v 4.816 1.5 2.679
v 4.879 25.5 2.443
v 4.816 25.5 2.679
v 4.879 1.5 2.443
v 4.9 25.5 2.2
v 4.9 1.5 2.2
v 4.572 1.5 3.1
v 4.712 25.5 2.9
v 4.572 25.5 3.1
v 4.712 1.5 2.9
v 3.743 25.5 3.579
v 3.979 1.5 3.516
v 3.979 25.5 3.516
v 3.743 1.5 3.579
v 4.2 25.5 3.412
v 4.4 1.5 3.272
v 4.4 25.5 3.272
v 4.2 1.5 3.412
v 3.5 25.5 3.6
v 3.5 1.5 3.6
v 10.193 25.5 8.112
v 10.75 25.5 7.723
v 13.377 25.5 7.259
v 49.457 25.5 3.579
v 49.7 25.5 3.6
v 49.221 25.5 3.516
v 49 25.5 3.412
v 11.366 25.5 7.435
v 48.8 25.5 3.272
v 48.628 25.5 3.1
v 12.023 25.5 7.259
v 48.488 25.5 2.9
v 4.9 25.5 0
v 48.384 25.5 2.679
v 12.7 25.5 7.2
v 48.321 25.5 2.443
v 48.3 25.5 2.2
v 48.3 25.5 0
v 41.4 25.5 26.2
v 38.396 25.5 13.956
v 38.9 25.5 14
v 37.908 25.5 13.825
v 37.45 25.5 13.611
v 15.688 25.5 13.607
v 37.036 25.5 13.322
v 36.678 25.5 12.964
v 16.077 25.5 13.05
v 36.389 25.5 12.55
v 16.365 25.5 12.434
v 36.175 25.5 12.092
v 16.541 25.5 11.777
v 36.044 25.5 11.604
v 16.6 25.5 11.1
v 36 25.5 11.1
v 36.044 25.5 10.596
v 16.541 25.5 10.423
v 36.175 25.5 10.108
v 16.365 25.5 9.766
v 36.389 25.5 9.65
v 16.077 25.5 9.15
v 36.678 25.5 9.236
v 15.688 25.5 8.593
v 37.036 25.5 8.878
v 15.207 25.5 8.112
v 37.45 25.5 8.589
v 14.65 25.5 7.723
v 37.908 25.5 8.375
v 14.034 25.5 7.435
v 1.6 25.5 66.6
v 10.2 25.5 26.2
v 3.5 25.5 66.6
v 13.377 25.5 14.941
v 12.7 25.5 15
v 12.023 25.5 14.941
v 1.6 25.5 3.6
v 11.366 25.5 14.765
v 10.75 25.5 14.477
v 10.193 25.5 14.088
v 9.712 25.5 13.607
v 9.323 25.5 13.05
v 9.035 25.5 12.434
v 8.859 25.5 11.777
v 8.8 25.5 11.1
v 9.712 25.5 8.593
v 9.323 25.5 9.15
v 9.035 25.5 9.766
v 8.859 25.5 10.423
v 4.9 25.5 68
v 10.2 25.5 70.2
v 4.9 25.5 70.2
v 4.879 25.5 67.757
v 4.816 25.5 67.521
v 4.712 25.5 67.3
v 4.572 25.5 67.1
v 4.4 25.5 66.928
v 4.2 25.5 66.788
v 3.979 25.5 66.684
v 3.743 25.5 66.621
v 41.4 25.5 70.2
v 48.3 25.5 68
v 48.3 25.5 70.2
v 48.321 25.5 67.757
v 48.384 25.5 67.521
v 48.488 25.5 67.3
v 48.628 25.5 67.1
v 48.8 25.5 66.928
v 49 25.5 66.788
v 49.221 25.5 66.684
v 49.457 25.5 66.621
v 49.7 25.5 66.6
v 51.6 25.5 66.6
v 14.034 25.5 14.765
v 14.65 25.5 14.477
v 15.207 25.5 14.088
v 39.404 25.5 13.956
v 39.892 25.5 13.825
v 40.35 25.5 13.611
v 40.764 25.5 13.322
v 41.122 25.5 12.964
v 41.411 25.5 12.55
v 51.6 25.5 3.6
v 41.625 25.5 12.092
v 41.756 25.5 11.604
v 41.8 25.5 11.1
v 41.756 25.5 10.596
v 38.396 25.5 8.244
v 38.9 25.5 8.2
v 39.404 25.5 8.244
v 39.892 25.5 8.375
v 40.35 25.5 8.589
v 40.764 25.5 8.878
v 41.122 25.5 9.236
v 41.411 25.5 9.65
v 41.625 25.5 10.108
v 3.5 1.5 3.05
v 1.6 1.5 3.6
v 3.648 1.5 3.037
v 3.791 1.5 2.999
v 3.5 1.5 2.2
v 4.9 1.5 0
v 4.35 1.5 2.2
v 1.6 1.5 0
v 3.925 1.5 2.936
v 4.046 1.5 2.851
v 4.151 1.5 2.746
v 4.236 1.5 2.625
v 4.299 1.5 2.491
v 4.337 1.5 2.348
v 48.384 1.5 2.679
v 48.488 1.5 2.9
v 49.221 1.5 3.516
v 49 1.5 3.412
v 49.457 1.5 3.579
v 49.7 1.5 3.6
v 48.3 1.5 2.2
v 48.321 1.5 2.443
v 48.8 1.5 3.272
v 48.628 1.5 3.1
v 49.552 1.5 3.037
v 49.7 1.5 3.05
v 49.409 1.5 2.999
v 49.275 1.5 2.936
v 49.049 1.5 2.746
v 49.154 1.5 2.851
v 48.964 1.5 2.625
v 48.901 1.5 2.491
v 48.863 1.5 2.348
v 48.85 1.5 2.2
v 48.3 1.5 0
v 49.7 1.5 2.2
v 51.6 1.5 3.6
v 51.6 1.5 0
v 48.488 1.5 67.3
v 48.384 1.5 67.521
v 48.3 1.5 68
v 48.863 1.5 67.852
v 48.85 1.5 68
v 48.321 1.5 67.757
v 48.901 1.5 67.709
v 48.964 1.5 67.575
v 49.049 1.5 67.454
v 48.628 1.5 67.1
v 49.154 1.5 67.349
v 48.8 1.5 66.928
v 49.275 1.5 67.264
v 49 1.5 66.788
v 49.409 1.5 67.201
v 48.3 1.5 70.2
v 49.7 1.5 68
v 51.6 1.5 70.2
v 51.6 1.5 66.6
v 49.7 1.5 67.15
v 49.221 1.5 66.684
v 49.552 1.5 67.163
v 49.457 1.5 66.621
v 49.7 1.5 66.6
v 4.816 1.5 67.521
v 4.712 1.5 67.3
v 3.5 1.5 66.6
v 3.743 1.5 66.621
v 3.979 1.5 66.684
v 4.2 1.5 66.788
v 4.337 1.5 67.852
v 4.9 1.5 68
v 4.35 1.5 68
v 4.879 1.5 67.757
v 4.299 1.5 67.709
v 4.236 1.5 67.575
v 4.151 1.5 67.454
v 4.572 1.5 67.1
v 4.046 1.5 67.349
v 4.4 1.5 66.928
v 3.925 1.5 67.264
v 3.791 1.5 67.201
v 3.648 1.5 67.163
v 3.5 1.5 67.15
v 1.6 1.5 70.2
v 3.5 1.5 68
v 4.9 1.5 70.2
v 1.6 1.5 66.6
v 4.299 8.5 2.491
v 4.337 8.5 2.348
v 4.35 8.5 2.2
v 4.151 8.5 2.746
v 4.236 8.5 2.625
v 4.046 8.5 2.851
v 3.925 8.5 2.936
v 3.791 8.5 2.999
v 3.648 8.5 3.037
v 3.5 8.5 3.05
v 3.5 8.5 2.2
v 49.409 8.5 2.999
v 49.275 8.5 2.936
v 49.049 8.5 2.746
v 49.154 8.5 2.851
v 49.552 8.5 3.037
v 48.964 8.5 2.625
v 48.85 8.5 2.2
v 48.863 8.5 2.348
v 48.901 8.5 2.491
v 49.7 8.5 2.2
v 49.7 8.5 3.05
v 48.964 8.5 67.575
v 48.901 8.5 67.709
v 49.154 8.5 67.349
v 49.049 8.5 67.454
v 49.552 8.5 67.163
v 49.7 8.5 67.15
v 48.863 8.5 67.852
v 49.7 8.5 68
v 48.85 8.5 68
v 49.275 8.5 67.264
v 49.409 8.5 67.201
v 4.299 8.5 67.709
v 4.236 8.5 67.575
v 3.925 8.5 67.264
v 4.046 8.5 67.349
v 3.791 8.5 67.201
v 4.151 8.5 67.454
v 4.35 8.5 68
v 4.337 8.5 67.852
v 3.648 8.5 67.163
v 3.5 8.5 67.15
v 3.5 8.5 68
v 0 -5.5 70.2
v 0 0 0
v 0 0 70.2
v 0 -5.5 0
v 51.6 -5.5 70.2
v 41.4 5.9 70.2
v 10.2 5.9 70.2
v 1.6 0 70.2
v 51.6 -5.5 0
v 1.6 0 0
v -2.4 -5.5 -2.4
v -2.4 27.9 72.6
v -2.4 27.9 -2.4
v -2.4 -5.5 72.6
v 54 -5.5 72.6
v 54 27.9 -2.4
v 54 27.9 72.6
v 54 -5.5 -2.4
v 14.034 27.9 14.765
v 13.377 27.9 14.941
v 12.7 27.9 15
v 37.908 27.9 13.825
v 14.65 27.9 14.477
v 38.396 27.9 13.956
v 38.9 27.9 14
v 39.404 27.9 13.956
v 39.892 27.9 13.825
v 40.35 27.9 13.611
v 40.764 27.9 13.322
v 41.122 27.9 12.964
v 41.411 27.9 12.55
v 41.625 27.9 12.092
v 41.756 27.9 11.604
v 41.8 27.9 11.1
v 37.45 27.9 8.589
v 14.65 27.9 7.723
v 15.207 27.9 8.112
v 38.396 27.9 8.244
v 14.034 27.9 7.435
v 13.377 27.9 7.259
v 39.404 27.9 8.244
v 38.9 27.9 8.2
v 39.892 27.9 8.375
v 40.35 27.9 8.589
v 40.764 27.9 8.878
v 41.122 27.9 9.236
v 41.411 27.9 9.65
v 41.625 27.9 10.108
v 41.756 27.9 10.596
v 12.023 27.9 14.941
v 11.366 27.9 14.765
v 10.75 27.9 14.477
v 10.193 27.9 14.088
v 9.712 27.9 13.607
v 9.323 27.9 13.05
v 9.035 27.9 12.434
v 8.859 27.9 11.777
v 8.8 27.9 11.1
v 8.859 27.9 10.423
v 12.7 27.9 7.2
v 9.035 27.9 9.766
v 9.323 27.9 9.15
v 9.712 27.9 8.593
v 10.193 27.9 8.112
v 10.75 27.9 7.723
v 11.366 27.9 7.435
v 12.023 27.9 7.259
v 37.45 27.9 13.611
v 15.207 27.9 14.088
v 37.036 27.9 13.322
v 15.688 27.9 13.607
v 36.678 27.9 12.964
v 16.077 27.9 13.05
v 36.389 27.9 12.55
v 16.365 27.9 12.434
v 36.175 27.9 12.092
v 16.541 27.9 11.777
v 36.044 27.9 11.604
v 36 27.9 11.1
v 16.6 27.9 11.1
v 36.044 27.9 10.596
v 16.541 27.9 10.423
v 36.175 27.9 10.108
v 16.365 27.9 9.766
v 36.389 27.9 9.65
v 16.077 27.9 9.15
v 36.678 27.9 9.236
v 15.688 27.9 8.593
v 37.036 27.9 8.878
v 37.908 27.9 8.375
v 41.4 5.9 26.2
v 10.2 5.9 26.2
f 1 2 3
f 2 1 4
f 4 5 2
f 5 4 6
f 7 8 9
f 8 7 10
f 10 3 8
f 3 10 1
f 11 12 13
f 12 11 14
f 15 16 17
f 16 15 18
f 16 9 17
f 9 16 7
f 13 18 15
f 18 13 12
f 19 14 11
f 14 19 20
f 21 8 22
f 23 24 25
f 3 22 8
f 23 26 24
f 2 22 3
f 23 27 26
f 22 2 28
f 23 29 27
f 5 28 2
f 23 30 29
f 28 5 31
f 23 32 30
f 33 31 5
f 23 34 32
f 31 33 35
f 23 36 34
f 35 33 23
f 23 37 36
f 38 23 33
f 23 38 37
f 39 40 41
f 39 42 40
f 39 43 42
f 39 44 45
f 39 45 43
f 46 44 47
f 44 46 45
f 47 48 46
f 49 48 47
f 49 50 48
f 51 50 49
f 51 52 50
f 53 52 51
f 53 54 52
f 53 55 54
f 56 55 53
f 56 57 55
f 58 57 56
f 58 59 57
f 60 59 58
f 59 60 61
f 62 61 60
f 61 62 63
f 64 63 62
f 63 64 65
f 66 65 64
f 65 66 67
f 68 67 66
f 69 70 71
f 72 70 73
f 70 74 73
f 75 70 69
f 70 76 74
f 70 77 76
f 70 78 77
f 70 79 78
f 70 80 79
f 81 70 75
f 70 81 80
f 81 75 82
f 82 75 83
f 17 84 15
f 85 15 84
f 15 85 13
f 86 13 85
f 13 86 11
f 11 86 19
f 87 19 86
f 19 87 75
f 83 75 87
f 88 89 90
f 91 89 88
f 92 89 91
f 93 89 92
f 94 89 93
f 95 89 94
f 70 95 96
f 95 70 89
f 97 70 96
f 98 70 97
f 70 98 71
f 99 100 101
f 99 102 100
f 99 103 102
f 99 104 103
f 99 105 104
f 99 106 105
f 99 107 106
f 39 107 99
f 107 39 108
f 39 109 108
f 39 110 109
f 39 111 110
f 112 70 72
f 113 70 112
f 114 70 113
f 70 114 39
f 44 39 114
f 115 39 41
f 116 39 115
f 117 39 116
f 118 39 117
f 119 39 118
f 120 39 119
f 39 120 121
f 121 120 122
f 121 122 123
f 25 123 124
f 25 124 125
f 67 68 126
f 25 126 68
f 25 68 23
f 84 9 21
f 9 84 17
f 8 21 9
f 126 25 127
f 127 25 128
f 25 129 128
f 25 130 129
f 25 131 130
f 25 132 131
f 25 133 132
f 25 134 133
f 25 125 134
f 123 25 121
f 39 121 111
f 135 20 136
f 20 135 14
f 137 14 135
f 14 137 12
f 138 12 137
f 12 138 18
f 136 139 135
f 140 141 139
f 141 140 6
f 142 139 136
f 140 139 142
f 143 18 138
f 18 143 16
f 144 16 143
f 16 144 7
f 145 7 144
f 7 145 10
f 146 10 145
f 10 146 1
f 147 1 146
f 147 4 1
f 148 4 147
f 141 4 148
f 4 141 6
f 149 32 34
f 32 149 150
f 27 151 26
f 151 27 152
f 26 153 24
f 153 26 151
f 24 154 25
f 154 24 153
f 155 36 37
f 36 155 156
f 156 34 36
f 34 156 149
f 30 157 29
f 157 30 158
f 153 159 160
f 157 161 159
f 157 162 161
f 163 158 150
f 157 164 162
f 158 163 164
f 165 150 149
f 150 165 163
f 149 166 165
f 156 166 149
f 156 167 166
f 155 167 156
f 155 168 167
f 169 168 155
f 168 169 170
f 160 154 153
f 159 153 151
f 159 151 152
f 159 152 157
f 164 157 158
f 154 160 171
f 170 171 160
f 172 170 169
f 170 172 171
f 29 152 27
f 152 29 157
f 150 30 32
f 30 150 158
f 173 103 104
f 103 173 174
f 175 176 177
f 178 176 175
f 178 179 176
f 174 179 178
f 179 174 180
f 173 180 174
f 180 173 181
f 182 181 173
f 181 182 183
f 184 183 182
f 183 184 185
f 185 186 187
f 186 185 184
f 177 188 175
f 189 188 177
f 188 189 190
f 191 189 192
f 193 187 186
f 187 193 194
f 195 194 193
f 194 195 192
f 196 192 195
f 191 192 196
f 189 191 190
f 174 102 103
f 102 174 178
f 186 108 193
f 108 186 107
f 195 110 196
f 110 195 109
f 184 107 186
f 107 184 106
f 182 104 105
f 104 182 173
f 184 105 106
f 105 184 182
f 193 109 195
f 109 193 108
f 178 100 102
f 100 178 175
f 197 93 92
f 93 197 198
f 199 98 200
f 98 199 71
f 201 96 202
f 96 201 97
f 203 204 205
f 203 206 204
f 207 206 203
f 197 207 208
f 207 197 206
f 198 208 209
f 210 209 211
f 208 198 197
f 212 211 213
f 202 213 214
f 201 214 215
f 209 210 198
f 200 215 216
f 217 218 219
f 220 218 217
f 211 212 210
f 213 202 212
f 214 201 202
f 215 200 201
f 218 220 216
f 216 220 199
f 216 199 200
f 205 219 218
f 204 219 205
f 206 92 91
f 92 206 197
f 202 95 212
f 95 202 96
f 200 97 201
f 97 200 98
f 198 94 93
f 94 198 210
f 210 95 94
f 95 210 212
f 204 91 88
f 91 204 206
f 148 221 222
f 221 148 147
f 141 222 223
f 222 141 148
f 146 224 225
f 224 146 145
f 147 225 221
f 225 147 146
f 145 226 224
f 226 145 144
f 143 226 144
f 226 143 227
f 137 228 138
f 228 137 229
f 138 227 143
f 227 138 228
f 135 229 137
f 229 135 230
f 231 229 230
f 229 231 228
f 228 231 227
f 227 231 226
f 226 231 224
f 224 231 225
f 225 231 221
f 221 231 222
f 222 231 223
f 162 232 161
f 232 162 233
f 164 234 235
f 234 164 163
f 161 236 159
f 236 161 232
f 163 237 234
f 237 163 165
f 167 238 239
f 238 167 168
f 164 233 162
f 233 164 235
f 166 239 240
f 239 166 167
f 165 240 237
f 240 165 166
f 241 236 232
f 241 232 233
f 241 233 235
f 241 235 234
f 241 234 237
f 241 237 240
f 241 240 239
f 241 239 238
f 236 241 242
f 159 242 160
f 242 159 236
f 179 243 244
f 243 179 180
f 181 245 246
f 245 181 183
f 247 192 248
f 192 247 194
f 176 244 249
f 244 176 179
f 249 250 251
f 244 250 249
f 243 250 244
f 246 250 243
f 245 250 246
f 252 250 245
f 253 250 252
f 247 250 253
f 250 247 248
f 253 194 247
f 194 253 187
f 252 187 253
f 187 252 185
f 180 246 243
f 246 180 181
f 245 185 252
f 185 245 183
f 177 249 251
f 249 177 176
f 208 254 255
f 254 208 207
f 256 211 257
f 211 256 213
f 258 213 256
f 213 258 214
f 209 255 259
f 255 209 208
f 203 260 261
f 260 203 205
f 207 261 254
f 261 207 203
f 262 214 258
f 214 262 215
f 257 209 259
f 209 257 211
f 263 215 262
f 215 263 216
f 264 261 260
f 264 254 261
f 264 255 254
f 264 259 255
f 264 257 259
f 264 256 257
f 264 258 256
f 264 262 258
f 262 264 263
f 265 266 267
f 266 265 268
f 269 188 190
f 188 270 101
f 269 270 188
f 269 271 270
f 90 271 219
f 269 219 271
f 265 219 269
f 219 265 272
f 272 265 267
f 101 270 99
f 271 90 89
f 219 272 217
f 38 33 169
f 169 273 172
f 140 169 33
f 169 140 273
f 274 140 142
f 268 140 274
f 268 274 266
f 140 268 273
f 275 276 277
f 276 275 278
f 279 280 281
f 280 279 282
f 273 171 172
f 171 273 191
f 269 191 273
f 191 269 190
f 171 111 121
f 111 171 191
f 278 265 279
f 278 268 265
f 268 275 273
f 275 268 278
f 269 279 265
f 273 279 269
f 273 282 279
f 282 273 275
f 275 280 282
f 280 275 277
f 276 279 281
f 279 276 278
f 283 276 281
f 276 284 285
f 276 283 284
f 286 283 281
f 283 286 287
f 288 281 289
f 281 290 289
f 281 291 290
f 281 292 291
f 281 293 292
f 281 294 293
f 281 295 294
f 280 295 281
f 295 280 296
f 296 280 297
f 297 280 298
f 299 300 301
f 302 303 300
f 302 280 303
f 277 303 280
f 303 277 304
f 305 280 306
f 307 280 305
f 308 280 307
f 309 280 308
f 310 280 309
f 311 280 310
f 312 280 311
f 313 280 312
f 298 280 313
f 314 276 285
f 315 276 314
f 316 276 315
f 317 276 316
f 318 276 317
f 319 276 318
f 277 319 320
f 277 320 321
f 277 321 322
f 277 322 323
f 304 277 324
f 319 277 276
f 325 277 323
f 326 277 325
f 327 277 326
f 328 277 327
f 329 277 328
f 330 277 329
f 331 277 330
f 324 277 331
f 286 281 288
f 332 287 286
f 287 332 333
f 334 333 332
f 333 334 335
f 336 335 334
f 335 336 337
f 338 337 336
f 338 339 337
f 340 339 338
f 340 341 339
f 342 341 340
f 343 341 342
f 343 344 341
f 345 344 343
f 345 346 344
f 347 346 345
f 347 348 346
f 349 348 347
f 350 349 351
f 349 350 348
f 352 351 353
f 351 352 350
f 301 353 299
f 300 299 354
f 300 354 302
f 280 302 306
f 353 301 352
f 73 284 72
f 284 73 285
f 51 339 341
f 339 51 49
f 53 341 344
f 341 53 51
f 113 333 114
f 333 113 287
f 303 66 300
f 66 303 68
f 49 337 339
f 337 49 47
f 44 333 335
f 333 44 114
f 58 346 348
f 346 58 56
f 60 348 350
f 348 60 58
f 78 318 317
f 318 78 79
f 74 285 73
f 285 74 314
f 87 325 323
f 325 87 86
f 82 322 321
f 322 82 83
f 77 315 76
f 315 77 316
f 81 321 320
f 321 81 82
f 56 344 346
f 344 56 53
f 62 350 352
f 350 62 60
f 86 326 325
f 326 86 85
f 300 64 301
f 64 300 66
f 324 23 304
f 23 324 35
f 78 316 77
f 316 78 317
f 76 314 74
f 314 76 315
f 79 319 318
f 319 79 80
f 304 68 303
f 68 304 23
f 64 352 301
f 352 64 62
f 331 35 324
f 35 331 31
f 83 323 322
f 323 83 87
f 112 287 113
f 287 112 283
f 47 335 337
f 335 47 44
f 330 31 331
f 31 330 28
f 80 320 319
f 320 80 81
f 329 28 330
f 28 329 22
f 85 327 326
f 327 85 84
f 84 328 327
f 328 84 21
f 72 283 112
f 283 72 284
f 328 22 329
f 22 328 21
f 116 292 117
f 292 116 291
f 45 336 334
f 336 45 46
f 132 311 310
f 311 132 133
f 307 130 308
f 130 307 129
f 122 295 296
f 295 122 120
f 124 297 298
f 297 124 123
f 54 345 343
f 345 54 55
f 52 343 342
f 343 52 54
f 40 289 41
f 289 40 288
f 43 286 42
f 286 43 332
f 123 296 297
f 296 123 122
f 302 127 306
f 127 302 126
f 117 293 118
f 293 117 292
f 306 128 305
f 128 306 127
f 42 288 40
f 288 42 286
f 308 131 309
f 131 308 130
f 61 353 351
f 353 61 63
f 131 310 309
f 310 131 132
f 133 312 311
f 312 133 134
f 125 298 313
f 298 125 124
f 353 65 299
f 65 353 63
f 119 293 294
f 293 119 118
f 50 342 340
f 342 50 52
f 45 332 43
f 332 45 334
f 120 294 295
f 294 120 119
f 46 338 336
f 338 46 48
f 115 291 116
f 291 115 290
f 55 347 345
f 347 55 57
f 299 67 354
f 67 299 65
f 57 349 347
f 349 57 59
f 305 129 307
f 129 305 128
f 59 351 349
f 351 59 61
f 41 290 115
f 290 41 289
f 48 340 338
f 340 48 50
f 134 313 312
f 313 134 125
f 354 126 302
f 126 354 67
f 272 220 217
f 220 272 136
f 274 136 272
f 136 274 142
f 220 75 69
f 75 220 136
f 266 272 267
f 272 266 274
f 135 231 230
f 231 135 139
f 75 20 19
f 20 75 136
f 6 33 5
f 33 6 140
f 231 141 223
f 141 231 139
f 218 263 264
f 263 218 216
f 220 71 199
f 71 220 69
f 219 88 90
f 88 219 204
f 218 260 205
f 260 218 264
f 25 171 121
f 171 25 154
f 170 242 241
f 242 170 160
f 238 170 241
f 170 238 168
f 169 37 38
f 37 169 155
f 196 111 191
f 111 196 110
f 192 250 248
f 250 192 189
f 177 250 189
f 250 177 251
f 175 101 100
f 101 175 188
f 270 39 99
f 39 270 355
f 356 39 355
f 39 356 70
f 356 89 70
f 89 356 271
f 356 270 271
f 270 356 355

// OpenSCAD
$fn=36;

$sl = 7; //schraubenlänge gesamt
$sk = 1.5; //schraube kopfdicke
$pd = 1.5; //plattinendicke
$ledh = 7 - $pd; //led höhe
echo ("ledh: ", $ledh);

$lsqa = 45; //breite und höhe led leucht fläche

//50*70.2 //platinenmaße
$pb = 50;
$ph = 70.2;
$z=5.2;//abstand oben led quadratfläche
$x=1.7;//abstand links led quadratfläche
$agesamt=$pb-$lsqa;//
$x2=$agesamt-$x;
$ad=$agesamt/2; //durchschnittsabstand
$ax=$x2-$x; //zusatzshift ist durschschnittsabstand (also soll - tatsächlichen abstand
//falsch, da wir ja immer rechts mehr als den durschschnittsabstand haben, müssen wir schauen, dass wir links auf die breite von rechts kommen, der versinkt ja nirgends
$depth = 24; //tiefe von platine bis tiefsten bauteil (schalter)
$t=2.4;
$lr2lrh = 68; //loch von außenrand zu außenrand => mit platinenmaßen und loch durchmesser kann abstand von außen berechnet werden
$lr2lrb = 48.4;
$rb = ($pb-$lr2lrb)/2; //rand breite (lochabstand)
$rh = ($ph-$lr2lrh)/2; //rand breite (lochabstand)
$ld = 2.2; //loch durchmesser schrauben von platine
$lds = 1.7; //schraube selbst durchmesser
$mr = 2.8; //maximaler Radius von zentrum platinenloch bis zur nähesten lötstelle
$lswd = 5.8; //durchmesser switch loch
$lstd = 7.8; //durchmesser stecker loch
$hw = 4.8 - $pd; //hoehe widerstände, lötseite brauche ich nicht, da hier die schauben eh länger sind als benötigt
$loetd = 4; //doch lieber einkalkulieren, mit der 9v batterie könnte es dann doch eng werden
$mra = 1.4; //minimaler rand (links von vorne)
$schalter = 13; //höhe und breite schalter
$ast = $schalter + 2 - $lstd/2; //abstand stecker + switch, da switch 13 (mit toleranz 15)

echo ("agesamt: ", $agesamt);
echo ("x2: ", $x2);
echo ("ad: ", $ad);
echo ("ax: ", $ax);

/* [Wände] */
$platine = false;
$waende = true;
$rueckwand = true;
$loetzinn = false;

////////////////////
// Modules
////////////////////

module loch($h,$d,$y)
{
    translate([0,$y+$pd,0])
    rotate([90,0,0])
    cylinder(h=$h,d1=$d,d2=$d);
}

module platinenloch()
{
    loch($pd,$ld,0);
}

module platine()
{
    if ($platine)
    {
        color("green")
        cube([$pb,$pd,$ph]);
    }
    
    if ($platine)
    {
        loecher()
        {
            color("orange")
            platinenloch();
        }
    }
    
    loecher()
    {
        color("gray")
        loch($sl,$lds,$sl);
    }
}

module loecher()
{
    translate([$ld/2+$rb,0,$ld/2+$rh])
    children(0);
    
    translate([$pb-$ld/2-$rb,0,$ld/2+$rh])
    children(0);
    
    translate([$pb-$ld/2-$rb,0,$ph-$ld/2-$rh])
    children(0);
    
    translate([$ld/2+$rb,0,$ph-$ld/2-$rh])
    children(0);  
}

module platinenzentrum()
{
    difference()
    {
color("blue")
loecher()
        
        
    
{
    loch($depth,$mr,$depth);
}
platine();
}

if ($platine)
{
//LEDs
color("white")
translate([$x,-$ledh,$ph-$lsqa-$z])
cube([$lsqa,$ledh,$lsqa]);
}
}

if ($loetzinn)
{
//Lötzinn
color("gray")
translate([$ax+$mra/2,$pd,$mra/2])
cube([$pb-$mra,$loetd,$ph-$mra]);
}

translate([$ax,0,0])
platinenzentrum();

if ($waende)
{
//Wände
//links
translate([-$t,$pd,0])
cube([$t,$depth,$ph]);
//rechts
translate([$pb+$ax,$pd,0])
cube([$t,$depth,$ph]);

//links
color("pink")
translate([-$t,-$ledh,0])
cube([$t,$pd+$ledh,$ph]);
//rechts
color("pink")
translate([$pb+$ax,-$ledh,0])
cube([$t,$pd+$ledh,$ph]);

//unten
color("#FF0000")
translate([-$t,-$ledh,-$t])
cube([$t+$pb+$ax+$t,$pd+$ledh,$t]);

//oben
color("#FF0000")
translate([-$t,-$ledh,$ph])
cube([$t+$pb+$ax+$t,$pd+$ledh,$t]);

//unten
color("#FF4444")
translate([-$t,$pd,-$t])
cube([$t+$pb+$ax+$t,$depth,$t]);

//oben
color("#FF4444")
translate([-$t,$pd,$ph])
cube([$t+$pb+$ax+$t,$depth,$t]);
}

if ($rueckwand)
{
    difference()
    {
//hinten
color("#FF8888") //absichtlich, damit perspektive von vorne besser mittigkeit von leds beurteilen lässt
translate([-$t,$depth+$pd,-$t])
cube([$t+$pb+$ax+$t,$t,$t+$ph+$t]);
    
    
//loch stecker
translate([$ast+$ax,$pd,$ast])
color("#AA88FF")
loch($t,$lstd,$depth+$t-$pd);

//loch schalter
translate([$pb-$ast,$pd,$ast])
color("#AA8822")
loch($t,$lswd,$depth+$t-$pd);
    }
}

//platinenersatz
//damit kein staub rein kommt, könnten wir ja links den schlitz zudrucken, mit einem stück was ax füllt und so dick ist wie die platine
color("#44FF44")
cube([$ax,$pd+$depth, $ph]); //das muss bis hinter, sonst muss ich support drucken



//platinenhalter zum rand
color("#AAAAFF")
translate([$ax,$pd,0])
cube([$rb+$ld+($mr-$ld)/2-$mr/2,$depth,$rh+$ld+($mr-$ld)/2]);

color("#AAAAFF")
translate([$ax,$pd,0])
cube([$rb+$ld+($mr-$ld)/2,$depth,$rh+$ld+($mr-$ld)/2-$mr/2]);

color("#AAAAFF")
translate([$ax,$pd,$ph-($rh+$ld+($mr-$ld)/2)])
cube([$rb+$ld+($mr-$ld)/2-$mr/2,$depth,$rh+$ld+($mr-$ld)/2]);

color("#AAAAFF")
translate([$ax,$pd,$ph-($rh+$ld+($mr-$ld)/2-$mr/2)])
cube([$rb+$ld+($mr-$ld)/2,$depth,$rh+$ld+($mr-$ld)/2-$mr/2]);

color("#AAAAFF")
translate([($ax+$pb)-($rb+$ld+($mr-$ld)/2-$mr/2),$pd,0])
cube([$rb+$ld+($mr-$ld)/2-$mr/2,$depth,$rh+$ld+($mr-$ld)/2]);

color("#AAAAFF")
translate([($ax+$pb)-($rb+$ld+($mr-$ld)/2),$pd,0])
cube([$rb+$ld+($mr-$ld)/2,$depth,$rh+$ld+($mr-$ld)/2-$mr/2]);

color("#AAAAFF")
translate([($ax+$pb)-($rb+$ld+($mr-$ld)/2-$mr/2),$pd,$ph-($rh+$ld+($mr-$ld)/2)])
cube([$rb+$ld+($mr-$ld)/2-$mr/2,$depth,$rh+$ld+($mr-$ld)/2]);

color("#AAAAFF")
translate([($ax+$pb)-($rb+$ld+($mr-$ld)/2),$pd,$ph-($rh+$ld+($mr-$ld)/2-$mr/2)])
cube([$rb+$ld+($mr-$ld)/2,$depth,$rh+$ld+($mr-$ld)/2-$mr/2]);

//9v batterie (oben muss er durchstoßen, aber hinten nehmen wir einfach die Wand die eh schon da ist)
$9vb=26.4; //wiki 26.2
$9vd=17.2; //wiki 17
$9vh=44; //wiki 48.5 aber wir wollen ja, dass er oben raussteht
color("#973512")
translate([(($ax+$pb)-$9vb)/2,$pd+$depth-$9vd,($ph-$9vh)+$t])
cube([$9vb,$9vd,$9vh]);

//9v batteriefach
$9vbs=$9vb+$t*2;
$9vds=$9vd+$t;
$9vhs=$9vh+$t;
color("#351297")
translate([(($ax+$pb)-$9vbs)/2,$pd+$depth-$9vds,($ph-$9vhs)+$t])
cube([$9vbs,$9vds,$9vhs]);
